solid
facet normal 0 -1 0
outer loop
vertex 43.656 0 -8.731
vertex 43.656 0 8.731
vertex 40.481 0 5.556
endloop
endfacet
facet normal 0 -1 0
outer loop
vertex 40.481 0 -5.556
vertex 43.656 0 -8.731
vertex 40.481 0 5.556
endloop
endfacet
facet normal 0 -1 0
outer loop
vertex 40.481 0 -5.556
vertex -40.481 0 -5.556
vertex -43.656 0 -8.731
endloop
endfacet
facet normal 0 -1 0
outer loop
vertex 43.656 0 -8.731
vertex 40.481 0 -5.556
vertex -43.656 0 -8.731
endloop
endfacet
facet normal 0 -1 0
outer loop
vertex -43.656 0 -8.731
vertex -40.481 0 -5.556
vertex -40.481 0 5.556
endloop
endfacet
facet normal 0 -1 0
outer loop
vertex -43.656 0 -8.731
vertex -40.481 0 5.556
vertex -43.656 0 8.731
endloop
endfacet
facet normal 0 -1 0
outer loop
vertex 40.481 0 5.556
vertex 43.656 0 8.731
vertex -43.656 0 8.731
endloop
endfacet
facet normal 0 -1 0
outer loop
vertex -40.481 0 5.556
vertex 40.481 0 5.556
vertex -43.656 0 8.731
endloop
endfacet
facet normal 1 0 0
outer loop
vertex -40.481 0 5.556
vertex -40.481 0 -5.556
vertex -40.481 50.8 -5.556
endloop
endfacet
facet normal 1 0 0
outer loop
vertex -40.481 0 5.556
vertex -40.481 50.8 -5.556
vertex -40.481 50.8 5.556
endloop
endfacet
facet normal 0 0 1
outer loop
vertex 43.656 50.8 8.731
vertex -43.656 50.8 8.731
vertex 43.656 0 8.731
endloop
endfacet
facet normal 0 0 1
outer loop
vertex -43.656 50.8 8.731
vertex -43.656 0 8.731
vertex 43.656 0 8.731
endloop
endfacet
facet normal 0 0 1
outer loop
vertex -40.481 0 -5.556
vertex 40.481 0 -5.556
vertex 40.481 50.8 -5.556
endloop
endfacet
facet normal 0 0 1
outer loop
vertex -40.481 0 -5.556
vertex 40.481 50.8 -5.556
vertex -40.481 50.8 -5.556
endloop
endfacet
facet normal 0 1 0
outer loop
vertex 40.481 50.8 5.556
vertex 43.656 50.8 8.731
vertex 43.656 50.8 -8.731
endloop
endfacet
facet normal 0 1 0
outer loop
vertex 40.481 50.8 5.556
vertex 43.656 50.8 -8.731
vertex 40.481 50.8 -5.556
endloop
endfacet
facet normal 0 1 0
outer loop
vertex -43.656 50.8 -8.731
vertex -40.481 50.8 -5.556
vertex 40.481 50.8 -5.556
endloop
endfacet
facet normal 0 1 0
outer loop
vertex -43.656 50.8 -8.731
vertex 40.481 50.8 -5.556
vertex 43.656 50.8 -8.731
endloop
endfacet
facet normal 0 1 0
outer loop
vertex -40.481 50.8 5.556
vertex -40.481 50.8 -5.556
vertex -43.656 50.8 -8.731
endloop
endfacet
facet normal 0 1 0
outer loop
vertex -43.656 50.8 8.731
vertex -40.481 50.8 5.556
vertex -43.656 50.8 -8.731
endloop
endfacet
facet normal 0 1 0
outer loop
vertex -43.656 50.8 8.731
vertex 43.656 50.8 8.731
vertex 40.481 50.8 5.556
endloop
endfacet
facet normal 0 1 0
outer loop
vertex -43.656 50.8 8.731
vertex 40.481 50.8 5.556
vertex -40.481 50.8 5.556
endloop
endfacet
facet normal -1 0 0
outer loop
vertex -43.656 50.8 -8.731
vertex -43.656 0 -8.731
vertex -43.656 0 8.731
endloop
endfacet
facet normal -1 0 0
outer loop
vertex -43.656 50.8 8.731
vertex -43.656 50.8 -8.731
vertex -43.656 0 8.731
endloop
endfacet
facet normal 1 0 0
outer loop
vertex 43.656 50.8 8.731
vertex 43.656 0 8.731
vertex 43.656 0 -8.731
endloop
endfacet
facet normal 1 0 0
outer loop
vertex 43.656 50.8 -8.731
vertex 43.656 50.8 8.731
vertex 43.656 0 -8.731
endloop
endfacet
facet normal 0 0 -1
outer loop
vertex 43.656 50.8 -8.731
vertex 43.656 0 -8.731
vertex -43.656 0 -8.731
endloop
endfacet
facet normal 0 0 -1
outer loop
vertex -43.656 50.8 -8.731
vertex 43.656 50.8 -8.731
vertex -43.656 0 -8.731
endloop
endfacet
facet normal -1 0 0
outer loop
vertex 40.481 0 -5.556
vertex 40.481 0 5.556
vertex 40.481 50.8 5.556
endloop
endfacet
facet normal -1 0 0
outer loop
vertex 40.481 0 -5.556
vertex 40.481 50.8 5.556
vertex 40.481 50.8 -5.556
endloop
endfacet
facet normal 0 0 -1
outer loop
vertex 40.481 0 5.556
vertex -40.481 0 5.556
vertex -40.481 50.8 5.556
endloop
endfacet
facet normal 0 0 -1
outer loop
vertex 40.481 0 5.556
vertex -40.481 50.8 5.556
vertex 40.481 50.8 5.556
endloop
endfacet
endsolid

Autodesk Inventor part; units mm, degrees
ref_plane "YZ Plane" through (0, 0, 0) normal (1, 0, 0) x (0, 1, 0)
ref_plane "XZ Plane" through (0, 0, 0) normal (0, 1, 0) x (-1, 0, 0)
ref_plane "XY Plane" through (0, 0, 0) normal (0, 0, 1) x (1, 0, 0)
sketch "Sketch1" plane through (0, 0, 0) normal (0, 1, 0) x (-1, 0, 0)
  line L0 (-43.6562, 8.7312) -> (-43.6562, -8.7312)
  line L1 (-43.6562, -8.7312) -> (43.6562, -8.7312)
  line L2 (43.6562, -8.7312) -> (43.6562, 8.7312)
  line L3 (43.6562, 8.7312) -> (-43.6562, 8.7312)
  line L4 (-43.6562, 8.7312) -> (43.6562, -8.7312) construction
  line L5 (-43.6562, -8.7312) -> (43.6562, 8.7312) construction
  line L6 (-40.4812, 5.5563) -> (-40.4812, -5.5563)
  line L7 (-40.4812, -5.5563) -> (40.4812, -5.5563)
  line L8 (40.4812, -5.5563) -> (40.4812, 5.5563)
  line L9 (40.4812, 5.5563) -> (-40.4812, 5.5563)
  line L10 (-40.4812, 5.5563) -> (40.4812, -5.5563) construction
  line L11 (-40.4812, -5.5563) -> (40.4812, 5.5563) construction
  point P0 (0, 0)
  dimension "d0" = 17.4625
  dimension "d1" = 87.3125
  dimension "d2" = 3.175
  dimension "d3" = 3.175
extrude "Extrusion1" add sketch "Sketch1" along normal blind 50.8
properties part number "spacer-0_6875x3_4375"
